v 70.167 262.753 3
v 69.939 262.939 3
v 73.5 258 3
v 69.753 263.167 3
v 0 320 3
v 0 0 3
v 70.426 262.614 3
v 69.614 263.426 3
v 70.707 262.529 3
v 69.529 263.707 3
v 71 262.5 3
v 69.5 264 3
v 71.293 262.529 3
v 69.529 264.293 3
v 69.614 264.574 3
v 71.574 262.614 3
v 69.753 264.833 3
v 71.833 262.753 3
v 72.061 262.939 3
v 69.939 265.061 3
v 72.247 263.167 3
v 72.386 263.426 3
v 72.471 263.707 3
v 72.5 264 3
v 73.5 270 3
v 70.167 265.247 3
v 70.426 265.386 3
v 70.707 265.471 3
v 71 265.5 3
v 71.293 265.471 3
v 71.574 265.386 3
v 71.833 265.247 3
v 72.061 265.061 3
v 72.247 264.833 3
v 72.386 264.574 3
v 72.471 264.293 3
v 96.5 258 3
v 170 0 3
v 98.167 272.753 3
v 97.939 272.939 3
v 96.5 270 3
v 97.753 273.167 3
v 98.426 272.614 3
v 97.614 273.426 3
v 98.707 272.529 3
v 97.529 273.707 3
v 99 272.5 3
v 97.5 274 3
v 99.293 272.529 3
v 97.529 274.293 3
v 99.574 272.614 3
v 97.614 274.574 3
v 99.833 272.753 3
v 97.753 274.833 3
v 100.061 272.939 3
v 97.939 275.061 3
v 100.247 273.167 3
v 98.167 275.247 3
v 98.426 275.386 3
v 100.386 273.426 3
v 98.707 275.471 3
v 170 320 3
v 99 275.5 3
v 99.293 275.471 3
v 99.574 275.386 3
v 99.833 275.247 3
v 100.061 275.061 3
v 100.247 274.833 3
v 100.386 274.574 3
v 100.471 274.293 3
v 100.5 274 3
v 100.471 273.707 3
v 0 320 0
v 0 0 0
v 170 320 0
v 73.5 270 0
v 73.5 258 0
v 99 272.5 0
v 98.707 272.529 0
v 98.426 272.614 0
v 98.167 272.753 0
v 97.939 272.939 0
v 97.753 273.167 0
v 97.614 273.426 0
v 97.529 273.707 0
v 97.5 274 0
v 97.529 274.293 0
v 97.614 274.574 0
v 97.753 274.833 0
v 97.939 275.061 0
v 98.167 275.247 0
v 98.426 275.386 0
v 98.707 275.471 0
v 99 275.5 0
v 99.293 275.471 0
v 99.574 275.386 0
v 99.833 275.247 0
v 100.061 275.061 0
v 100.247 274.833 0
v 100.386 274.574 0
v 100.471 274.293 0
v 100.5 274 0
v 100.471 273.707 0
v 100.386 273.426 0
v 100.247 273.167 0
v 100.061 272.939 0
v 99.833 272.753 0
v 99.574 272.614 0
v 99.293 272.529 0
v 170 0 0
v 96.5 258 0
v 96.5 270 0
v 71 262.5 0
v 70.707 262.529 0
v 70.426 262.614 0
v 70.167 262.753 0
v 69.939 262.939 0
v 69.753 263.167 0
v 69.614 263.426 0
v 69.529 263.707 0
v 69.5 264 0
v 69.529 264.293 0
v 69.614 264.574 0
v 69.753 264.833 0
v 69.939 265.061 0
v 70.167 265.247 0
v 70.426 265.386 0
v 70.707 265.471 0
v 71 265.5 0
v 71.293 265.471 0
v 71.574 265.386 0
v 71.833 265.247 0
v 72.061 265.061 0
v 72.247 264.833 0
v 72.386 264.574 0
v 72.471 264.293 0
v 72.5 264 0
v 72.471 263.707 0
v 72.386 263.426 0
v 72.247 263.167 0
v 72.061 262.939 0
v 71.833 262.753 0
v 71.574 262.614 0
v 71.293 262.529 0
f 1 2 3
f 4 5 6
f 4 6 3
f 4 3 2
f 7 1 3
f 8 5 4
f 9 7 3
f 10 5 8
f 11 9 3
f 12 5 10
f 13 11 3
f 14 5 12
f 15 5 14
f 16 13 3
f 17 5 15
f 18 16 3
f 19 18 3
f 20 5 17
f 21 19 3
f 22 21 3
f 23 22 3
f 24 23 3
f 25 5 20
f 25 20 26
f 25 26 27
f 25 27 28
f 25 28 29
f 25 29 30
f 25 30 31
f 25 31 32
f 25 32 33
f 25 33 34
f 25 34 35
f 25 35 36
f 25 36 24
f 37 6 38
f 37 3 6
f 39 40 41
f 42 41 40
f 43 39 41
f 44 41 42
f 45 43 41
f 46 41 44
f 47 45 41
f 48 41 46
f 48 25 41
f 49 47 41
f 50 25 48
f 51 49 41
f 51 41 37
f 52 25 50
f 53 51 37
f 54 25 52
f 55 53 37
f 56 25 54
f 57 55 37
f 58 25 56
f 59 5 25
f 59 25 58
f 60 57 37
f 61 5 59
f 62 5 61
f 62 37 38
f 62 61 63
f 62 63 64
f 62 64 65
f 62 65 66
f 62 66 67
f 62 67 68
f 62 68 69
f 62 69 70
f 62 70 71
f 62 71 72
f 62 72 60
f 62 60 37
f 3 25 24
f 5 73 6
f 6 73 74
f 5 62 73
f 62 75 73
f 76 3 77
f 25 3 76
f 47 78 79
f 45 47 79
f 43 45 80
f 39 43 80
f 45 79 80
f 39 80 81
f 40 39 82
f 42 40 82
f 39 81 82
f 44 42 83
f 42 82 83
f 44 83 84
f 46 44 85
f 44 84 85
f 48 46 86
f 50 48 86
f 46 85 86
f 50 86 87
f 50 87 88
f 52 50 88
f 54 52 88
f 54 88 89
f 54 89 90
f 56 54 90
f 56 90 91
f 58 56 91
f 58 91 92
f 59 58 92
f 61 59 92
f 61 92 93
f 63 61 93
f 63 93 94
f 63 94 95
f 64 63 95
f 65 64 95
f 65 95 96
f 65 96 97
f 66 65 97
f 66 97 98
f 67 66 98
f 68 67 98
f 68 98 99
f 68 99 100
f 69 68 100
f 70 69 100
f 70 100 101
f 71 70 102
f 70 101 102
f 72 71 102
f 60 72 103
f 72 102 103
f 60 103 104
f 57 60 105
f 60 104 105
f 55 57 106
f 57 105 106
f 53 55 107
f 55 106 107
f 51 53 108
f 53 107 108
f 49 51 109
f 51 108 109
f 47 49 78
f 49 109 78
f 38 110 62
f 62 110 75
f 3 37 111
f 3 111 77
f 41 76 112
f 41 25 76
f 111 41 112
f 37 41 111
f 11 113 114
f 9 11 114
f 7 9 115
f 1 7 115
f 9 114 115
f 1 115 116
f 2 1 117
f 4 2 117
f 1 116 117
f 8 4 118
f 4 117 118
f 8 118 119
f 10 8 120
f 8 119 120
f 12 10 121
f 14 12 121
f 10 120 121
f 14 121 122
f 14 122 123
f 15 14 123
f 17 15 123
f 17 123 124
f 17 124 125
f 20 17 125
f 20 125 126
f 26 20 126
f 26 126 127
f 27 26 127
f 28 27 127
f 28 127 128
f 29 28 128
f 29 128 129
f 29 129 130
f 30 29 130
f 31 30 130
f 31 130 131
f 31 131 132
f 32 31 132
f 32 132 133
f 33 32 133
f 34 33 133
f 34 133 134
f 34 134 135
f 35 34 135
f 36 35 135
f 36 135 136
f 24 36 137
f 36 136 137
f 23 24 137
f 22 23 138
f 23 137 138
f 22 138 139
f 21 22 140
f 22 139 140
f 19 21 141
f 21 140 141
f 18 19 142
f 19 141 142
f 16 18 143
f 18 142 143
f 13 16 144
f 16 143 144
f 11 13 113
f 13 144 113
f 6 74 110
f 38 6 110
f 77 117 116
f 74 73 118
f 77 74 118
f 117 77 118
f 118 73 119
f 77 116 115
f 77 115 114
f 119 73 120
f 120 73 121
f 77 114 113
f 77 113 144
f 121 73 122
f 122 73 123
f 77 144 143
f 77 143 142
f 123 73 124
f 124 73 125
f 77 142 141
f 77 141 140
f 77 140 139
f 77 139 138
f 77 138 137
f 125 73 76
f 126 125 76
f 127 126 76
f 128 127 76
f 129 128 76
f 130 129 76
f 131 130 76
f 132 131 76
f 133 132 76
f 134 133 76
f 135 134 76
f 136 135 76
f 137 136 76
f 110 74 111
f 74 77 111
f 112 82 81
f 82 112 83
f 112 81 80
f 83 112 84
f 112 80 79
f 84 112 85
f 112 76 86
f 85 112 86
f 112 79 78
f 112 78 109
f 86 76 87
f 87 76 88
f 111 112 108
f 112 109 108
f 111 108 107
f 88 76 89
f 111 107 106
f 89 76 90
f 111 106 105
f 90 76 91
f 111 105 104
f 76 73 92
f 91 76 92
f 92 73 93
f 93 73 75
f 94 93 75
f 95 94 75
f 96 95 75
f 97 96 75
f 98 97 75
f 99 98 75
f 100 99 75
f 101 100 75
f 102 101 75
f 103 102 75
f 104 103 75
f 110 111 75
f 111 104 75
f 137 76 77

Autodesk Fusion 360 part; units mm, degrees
sketch "Sketch1" plane through (0, 0, 0) normal (0, 0, 1) x (1, 0, 0)
  line L0 (0, 0) -> (170, 0)
  line L1 (170, 0) -> (170, 320)
  line L2 (170, 320) -> (0, 320)
  line L3 (0, 320) -> (0, 0)
  dimension "d1" = 170
  dimension "d2" = 320
extrude "Extrude1" add sketch "Sketch1" along normal blind 3
sketch "Sketch2" plane through (0, 0, 3) normal (0, 0, 1) x (-1, 0, 0)
  line L0 (0, -320) -> (0, 0)
  line L1 (0, 0) -> (-170, 0)
  line L2 (-170, 0) -> (-170, -320)
  line L3 (-170, -320) -> (0, -320)
  line L4 (-73.5, -270) -> (-96.5, -270)
  line L5 (-96.5, -270) -> (-96.5, -258)
  line L6 (-96.5, -258) -> (-73.5, -258)
  line L7 (-73.5, -258) -> (-73.5, -270)
  dimension "d8" = 23
  dimension "d9" = 12
  dimension "d10" = 73.5
  dimension "d12" = 73.5
  dimension "d13" = 50
extrude "Extrude2" cut sketch "Sketch2" against normal blind 3 contours L4 L5 L6 L7
sketch "dd" plane through (0, 0, 3) normal (0, 0, 1) x (-1, 0, 0)
  line L0 (-41.5, -99) -> (-128.5, -99)
  line L1 (-128.5, -99) -> (-128.5, -221)
  line L2 (-128.5, -221) -> (-41.5, -221)
  line L3 (-41.5, -221) -> (-41.5, -99)
  line L4 (0, -320) -> (0, 0)
  line L5 (-170, 0) -> (-170, -320)
  line L6 (0, 0) -> (-170, 0)
  line L7 (-170, -320) -> (0, -320)
  dimension "d16" = 122
  dimension "d17" = 87
  dimension "d18" = 41.5
  dimension "d19" = 41.5
  dimension "d20" = 99
  dimension "d21" = 99
sketch "Sketch6" plane through (0, 0, 3) normal (0, 0, 1) x (-1, 0, 0)
  circle A0 centre (-99, -264) radius 1.5
  line L0 (-96.5, -270) -> (-96.5, -258)
  circle A1 centre (-99, -274) radius 1.5
  circle A2 centre (-71, -264) radius 1.5
  line L1 (-73.5, -258) -> (-73.5, -270)
  dimension "d22" = 2.5
  dimension "d23" = 3
  dimension "d24" = 6
  dimension "d26" = 3
  dimension "d27" = 2.5
  dimension "d28" = 6
hole "Hole1" at (71, 264, 3) direction (0, 0, -1) diameter 3 depth 3 tip angle 118
hole "Hole2" at (99, 274, 3) direction (0, 0, -1) diameter 3 depth 3 tip angle 118
